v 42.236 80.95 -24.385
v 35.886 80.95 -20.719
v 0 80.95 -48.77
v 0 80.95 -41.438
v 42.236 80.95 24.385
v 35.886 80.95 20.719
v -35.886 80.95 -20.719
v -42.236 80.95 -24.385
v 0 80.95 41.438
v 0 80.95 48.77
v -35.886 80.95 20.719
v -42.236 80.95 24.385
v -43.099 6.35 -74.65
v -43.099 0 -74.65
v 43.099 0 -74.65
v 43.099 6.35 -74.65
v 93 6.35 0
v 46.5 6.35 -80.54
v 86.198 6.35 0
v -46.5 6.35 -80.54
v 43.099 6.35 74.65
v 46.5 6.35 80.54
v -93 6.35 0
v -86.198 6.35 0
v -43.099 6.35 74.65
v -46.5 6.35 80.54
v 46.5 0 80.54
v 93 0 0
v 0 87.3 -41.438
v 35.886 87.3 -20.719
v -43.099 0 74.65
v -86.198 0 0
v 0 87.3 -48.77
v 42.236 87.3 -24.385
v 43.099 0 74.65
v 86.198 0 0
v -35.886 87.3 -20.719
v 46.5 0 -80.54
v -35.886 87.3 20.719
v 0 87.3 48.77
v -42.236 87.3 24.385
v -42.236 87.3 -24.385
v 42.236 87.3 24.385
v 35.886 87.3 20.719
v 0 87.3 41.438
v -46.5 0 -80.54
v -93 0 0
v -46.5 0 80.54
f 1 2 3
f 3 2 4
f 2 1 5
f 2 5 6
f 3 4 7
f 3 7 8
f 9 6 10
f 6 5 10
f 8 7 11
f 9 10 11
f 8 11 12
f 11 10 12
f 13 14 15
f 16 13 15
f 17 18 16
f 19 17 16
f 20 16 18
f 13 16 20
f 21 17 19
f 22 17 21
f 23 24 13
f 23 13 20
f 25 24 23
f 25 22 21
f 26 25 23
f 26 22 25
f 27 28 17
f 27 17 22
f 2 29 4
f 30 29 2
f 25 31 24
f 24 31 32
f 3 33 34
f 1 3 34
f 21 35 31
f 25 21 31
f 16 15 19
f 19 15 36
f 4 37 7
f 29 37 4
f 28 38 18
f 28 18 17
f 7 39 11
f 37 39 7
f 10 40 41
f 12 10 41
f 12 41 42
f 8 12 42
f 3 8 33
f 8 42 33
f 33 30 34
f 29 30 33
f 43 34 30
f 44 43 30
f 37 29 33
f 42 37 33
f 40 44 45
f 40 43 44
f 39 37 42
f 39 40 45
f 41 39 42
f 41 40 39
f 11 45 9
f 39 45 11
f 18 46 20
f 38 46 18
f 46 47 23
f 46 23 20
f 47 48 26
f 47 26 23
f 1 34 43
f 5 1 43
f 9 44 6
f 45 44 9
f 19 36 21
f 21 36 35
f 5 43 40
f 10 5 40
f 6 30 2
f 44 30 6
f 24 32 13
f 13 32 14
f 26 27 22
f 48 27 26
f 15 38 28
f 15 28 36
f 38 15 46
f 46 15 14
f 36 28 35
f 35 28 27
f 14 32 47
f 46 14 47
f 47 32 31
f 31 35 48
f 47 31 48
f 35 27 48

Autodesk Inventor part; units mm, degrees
ref_plane "YZ Plane" through (0, 0, 0) normal (1, 0, 0) x (0, 1, 0)
ref_plane "XY Plane" through (0, 0, 0) normal (0, 0, 1) x (1, 0, 0)
sketch "Sketch1" plane through (0, 0, 0) normal (0, 1, 0) x (-1, 0, 0)
  line L0 (93, 0) -> (46.5, -80.5404)
  line L1 (46.5, -80.5404) -> (-46.5, -80.5404)
  line L2 (-46.5, -80.5404) -> (-93, 0)
  line L3 (-93, 0) -> (-46.5, 80.5404)
  line L4 (-46.5, 80.5404) -> (46.5, 80.5404)
  line L5 (46.5, 80.5404) -> (93, 0)
  line L6 (43.0992, -74.65) -> (-43.0992, -74.65)
  line L7 (-43.0992, -74.65) -> (-86.1984, 0)
  line L8 (-86.1984, 0) -> (-43.0992, 74.65)
  line L9 (-43.0992, 74.65) -> (43.0992, 74.65)
  line L10 (43.0992, 74.65) -> (86.1984, 0)
  line L11 (86.1984, 0) -> (43.0992, -74.65)
  point P0 (0, 0)
  point P1 (0, 0)
  point P2 (0, 0)
extrude "Extrusion1" add sketch "Sketch1" along normal blind 6.35
ref_plane "Work Plane1" through (0, 87.3, 0) normal (0, 1, 0) x (-1, 0, 0)
sketch "Sketch2" plane through (0, 0, 0) normal (0, 0, 1) x (1, 0, 0)
  circle A0 centre (0, 0) radius 100
  dimension "d5" = 200
sketch "Sketch3" plane through (0, 87.3, 0) normal (0, 1, 0) x (-1, 0, 0)
  line L0 (-86.1984, 0) -> (-43.0992, 74.65) projected
  line L1 (-42.2361, 24.385) -> (0, 48.77)
  line L2 (0, 48.77) -> (42.2361, 24.385)
  line L3 (42.2361, 24.385) -> (42.2361, -24.385)
  line L4 (42.2361, -24.385) -> (0, -48.77)
  line L5 (0, -48.77) -> (-42.2361, -24.385)
  line L6 (-42.2361, -24.385) -> (-42.2361, 24.385)
  line L7 (0, 41.4376) -> (35.886, 20.7188)
  line L8 (35.886, 20.7188) -> (35.886, -20.7188)
  line L9 (35.886, -20.7188) -> (0, -41.4376)
  line L10 (0, -41.4376) -> (-35.886, -20.7188)
  line L11 (-35.886, -20.7188) -> (-35.886, 20.7188)
  line L12 (-35.886, 20.7188) -> (0, 41.4376)
  point P0 (0, 0)
extrude "Extrusion2" add sketch "Sketch3" against normal blind 6.35
sketch3d "3D Sketch1"
properties part number "Straight Dome"
